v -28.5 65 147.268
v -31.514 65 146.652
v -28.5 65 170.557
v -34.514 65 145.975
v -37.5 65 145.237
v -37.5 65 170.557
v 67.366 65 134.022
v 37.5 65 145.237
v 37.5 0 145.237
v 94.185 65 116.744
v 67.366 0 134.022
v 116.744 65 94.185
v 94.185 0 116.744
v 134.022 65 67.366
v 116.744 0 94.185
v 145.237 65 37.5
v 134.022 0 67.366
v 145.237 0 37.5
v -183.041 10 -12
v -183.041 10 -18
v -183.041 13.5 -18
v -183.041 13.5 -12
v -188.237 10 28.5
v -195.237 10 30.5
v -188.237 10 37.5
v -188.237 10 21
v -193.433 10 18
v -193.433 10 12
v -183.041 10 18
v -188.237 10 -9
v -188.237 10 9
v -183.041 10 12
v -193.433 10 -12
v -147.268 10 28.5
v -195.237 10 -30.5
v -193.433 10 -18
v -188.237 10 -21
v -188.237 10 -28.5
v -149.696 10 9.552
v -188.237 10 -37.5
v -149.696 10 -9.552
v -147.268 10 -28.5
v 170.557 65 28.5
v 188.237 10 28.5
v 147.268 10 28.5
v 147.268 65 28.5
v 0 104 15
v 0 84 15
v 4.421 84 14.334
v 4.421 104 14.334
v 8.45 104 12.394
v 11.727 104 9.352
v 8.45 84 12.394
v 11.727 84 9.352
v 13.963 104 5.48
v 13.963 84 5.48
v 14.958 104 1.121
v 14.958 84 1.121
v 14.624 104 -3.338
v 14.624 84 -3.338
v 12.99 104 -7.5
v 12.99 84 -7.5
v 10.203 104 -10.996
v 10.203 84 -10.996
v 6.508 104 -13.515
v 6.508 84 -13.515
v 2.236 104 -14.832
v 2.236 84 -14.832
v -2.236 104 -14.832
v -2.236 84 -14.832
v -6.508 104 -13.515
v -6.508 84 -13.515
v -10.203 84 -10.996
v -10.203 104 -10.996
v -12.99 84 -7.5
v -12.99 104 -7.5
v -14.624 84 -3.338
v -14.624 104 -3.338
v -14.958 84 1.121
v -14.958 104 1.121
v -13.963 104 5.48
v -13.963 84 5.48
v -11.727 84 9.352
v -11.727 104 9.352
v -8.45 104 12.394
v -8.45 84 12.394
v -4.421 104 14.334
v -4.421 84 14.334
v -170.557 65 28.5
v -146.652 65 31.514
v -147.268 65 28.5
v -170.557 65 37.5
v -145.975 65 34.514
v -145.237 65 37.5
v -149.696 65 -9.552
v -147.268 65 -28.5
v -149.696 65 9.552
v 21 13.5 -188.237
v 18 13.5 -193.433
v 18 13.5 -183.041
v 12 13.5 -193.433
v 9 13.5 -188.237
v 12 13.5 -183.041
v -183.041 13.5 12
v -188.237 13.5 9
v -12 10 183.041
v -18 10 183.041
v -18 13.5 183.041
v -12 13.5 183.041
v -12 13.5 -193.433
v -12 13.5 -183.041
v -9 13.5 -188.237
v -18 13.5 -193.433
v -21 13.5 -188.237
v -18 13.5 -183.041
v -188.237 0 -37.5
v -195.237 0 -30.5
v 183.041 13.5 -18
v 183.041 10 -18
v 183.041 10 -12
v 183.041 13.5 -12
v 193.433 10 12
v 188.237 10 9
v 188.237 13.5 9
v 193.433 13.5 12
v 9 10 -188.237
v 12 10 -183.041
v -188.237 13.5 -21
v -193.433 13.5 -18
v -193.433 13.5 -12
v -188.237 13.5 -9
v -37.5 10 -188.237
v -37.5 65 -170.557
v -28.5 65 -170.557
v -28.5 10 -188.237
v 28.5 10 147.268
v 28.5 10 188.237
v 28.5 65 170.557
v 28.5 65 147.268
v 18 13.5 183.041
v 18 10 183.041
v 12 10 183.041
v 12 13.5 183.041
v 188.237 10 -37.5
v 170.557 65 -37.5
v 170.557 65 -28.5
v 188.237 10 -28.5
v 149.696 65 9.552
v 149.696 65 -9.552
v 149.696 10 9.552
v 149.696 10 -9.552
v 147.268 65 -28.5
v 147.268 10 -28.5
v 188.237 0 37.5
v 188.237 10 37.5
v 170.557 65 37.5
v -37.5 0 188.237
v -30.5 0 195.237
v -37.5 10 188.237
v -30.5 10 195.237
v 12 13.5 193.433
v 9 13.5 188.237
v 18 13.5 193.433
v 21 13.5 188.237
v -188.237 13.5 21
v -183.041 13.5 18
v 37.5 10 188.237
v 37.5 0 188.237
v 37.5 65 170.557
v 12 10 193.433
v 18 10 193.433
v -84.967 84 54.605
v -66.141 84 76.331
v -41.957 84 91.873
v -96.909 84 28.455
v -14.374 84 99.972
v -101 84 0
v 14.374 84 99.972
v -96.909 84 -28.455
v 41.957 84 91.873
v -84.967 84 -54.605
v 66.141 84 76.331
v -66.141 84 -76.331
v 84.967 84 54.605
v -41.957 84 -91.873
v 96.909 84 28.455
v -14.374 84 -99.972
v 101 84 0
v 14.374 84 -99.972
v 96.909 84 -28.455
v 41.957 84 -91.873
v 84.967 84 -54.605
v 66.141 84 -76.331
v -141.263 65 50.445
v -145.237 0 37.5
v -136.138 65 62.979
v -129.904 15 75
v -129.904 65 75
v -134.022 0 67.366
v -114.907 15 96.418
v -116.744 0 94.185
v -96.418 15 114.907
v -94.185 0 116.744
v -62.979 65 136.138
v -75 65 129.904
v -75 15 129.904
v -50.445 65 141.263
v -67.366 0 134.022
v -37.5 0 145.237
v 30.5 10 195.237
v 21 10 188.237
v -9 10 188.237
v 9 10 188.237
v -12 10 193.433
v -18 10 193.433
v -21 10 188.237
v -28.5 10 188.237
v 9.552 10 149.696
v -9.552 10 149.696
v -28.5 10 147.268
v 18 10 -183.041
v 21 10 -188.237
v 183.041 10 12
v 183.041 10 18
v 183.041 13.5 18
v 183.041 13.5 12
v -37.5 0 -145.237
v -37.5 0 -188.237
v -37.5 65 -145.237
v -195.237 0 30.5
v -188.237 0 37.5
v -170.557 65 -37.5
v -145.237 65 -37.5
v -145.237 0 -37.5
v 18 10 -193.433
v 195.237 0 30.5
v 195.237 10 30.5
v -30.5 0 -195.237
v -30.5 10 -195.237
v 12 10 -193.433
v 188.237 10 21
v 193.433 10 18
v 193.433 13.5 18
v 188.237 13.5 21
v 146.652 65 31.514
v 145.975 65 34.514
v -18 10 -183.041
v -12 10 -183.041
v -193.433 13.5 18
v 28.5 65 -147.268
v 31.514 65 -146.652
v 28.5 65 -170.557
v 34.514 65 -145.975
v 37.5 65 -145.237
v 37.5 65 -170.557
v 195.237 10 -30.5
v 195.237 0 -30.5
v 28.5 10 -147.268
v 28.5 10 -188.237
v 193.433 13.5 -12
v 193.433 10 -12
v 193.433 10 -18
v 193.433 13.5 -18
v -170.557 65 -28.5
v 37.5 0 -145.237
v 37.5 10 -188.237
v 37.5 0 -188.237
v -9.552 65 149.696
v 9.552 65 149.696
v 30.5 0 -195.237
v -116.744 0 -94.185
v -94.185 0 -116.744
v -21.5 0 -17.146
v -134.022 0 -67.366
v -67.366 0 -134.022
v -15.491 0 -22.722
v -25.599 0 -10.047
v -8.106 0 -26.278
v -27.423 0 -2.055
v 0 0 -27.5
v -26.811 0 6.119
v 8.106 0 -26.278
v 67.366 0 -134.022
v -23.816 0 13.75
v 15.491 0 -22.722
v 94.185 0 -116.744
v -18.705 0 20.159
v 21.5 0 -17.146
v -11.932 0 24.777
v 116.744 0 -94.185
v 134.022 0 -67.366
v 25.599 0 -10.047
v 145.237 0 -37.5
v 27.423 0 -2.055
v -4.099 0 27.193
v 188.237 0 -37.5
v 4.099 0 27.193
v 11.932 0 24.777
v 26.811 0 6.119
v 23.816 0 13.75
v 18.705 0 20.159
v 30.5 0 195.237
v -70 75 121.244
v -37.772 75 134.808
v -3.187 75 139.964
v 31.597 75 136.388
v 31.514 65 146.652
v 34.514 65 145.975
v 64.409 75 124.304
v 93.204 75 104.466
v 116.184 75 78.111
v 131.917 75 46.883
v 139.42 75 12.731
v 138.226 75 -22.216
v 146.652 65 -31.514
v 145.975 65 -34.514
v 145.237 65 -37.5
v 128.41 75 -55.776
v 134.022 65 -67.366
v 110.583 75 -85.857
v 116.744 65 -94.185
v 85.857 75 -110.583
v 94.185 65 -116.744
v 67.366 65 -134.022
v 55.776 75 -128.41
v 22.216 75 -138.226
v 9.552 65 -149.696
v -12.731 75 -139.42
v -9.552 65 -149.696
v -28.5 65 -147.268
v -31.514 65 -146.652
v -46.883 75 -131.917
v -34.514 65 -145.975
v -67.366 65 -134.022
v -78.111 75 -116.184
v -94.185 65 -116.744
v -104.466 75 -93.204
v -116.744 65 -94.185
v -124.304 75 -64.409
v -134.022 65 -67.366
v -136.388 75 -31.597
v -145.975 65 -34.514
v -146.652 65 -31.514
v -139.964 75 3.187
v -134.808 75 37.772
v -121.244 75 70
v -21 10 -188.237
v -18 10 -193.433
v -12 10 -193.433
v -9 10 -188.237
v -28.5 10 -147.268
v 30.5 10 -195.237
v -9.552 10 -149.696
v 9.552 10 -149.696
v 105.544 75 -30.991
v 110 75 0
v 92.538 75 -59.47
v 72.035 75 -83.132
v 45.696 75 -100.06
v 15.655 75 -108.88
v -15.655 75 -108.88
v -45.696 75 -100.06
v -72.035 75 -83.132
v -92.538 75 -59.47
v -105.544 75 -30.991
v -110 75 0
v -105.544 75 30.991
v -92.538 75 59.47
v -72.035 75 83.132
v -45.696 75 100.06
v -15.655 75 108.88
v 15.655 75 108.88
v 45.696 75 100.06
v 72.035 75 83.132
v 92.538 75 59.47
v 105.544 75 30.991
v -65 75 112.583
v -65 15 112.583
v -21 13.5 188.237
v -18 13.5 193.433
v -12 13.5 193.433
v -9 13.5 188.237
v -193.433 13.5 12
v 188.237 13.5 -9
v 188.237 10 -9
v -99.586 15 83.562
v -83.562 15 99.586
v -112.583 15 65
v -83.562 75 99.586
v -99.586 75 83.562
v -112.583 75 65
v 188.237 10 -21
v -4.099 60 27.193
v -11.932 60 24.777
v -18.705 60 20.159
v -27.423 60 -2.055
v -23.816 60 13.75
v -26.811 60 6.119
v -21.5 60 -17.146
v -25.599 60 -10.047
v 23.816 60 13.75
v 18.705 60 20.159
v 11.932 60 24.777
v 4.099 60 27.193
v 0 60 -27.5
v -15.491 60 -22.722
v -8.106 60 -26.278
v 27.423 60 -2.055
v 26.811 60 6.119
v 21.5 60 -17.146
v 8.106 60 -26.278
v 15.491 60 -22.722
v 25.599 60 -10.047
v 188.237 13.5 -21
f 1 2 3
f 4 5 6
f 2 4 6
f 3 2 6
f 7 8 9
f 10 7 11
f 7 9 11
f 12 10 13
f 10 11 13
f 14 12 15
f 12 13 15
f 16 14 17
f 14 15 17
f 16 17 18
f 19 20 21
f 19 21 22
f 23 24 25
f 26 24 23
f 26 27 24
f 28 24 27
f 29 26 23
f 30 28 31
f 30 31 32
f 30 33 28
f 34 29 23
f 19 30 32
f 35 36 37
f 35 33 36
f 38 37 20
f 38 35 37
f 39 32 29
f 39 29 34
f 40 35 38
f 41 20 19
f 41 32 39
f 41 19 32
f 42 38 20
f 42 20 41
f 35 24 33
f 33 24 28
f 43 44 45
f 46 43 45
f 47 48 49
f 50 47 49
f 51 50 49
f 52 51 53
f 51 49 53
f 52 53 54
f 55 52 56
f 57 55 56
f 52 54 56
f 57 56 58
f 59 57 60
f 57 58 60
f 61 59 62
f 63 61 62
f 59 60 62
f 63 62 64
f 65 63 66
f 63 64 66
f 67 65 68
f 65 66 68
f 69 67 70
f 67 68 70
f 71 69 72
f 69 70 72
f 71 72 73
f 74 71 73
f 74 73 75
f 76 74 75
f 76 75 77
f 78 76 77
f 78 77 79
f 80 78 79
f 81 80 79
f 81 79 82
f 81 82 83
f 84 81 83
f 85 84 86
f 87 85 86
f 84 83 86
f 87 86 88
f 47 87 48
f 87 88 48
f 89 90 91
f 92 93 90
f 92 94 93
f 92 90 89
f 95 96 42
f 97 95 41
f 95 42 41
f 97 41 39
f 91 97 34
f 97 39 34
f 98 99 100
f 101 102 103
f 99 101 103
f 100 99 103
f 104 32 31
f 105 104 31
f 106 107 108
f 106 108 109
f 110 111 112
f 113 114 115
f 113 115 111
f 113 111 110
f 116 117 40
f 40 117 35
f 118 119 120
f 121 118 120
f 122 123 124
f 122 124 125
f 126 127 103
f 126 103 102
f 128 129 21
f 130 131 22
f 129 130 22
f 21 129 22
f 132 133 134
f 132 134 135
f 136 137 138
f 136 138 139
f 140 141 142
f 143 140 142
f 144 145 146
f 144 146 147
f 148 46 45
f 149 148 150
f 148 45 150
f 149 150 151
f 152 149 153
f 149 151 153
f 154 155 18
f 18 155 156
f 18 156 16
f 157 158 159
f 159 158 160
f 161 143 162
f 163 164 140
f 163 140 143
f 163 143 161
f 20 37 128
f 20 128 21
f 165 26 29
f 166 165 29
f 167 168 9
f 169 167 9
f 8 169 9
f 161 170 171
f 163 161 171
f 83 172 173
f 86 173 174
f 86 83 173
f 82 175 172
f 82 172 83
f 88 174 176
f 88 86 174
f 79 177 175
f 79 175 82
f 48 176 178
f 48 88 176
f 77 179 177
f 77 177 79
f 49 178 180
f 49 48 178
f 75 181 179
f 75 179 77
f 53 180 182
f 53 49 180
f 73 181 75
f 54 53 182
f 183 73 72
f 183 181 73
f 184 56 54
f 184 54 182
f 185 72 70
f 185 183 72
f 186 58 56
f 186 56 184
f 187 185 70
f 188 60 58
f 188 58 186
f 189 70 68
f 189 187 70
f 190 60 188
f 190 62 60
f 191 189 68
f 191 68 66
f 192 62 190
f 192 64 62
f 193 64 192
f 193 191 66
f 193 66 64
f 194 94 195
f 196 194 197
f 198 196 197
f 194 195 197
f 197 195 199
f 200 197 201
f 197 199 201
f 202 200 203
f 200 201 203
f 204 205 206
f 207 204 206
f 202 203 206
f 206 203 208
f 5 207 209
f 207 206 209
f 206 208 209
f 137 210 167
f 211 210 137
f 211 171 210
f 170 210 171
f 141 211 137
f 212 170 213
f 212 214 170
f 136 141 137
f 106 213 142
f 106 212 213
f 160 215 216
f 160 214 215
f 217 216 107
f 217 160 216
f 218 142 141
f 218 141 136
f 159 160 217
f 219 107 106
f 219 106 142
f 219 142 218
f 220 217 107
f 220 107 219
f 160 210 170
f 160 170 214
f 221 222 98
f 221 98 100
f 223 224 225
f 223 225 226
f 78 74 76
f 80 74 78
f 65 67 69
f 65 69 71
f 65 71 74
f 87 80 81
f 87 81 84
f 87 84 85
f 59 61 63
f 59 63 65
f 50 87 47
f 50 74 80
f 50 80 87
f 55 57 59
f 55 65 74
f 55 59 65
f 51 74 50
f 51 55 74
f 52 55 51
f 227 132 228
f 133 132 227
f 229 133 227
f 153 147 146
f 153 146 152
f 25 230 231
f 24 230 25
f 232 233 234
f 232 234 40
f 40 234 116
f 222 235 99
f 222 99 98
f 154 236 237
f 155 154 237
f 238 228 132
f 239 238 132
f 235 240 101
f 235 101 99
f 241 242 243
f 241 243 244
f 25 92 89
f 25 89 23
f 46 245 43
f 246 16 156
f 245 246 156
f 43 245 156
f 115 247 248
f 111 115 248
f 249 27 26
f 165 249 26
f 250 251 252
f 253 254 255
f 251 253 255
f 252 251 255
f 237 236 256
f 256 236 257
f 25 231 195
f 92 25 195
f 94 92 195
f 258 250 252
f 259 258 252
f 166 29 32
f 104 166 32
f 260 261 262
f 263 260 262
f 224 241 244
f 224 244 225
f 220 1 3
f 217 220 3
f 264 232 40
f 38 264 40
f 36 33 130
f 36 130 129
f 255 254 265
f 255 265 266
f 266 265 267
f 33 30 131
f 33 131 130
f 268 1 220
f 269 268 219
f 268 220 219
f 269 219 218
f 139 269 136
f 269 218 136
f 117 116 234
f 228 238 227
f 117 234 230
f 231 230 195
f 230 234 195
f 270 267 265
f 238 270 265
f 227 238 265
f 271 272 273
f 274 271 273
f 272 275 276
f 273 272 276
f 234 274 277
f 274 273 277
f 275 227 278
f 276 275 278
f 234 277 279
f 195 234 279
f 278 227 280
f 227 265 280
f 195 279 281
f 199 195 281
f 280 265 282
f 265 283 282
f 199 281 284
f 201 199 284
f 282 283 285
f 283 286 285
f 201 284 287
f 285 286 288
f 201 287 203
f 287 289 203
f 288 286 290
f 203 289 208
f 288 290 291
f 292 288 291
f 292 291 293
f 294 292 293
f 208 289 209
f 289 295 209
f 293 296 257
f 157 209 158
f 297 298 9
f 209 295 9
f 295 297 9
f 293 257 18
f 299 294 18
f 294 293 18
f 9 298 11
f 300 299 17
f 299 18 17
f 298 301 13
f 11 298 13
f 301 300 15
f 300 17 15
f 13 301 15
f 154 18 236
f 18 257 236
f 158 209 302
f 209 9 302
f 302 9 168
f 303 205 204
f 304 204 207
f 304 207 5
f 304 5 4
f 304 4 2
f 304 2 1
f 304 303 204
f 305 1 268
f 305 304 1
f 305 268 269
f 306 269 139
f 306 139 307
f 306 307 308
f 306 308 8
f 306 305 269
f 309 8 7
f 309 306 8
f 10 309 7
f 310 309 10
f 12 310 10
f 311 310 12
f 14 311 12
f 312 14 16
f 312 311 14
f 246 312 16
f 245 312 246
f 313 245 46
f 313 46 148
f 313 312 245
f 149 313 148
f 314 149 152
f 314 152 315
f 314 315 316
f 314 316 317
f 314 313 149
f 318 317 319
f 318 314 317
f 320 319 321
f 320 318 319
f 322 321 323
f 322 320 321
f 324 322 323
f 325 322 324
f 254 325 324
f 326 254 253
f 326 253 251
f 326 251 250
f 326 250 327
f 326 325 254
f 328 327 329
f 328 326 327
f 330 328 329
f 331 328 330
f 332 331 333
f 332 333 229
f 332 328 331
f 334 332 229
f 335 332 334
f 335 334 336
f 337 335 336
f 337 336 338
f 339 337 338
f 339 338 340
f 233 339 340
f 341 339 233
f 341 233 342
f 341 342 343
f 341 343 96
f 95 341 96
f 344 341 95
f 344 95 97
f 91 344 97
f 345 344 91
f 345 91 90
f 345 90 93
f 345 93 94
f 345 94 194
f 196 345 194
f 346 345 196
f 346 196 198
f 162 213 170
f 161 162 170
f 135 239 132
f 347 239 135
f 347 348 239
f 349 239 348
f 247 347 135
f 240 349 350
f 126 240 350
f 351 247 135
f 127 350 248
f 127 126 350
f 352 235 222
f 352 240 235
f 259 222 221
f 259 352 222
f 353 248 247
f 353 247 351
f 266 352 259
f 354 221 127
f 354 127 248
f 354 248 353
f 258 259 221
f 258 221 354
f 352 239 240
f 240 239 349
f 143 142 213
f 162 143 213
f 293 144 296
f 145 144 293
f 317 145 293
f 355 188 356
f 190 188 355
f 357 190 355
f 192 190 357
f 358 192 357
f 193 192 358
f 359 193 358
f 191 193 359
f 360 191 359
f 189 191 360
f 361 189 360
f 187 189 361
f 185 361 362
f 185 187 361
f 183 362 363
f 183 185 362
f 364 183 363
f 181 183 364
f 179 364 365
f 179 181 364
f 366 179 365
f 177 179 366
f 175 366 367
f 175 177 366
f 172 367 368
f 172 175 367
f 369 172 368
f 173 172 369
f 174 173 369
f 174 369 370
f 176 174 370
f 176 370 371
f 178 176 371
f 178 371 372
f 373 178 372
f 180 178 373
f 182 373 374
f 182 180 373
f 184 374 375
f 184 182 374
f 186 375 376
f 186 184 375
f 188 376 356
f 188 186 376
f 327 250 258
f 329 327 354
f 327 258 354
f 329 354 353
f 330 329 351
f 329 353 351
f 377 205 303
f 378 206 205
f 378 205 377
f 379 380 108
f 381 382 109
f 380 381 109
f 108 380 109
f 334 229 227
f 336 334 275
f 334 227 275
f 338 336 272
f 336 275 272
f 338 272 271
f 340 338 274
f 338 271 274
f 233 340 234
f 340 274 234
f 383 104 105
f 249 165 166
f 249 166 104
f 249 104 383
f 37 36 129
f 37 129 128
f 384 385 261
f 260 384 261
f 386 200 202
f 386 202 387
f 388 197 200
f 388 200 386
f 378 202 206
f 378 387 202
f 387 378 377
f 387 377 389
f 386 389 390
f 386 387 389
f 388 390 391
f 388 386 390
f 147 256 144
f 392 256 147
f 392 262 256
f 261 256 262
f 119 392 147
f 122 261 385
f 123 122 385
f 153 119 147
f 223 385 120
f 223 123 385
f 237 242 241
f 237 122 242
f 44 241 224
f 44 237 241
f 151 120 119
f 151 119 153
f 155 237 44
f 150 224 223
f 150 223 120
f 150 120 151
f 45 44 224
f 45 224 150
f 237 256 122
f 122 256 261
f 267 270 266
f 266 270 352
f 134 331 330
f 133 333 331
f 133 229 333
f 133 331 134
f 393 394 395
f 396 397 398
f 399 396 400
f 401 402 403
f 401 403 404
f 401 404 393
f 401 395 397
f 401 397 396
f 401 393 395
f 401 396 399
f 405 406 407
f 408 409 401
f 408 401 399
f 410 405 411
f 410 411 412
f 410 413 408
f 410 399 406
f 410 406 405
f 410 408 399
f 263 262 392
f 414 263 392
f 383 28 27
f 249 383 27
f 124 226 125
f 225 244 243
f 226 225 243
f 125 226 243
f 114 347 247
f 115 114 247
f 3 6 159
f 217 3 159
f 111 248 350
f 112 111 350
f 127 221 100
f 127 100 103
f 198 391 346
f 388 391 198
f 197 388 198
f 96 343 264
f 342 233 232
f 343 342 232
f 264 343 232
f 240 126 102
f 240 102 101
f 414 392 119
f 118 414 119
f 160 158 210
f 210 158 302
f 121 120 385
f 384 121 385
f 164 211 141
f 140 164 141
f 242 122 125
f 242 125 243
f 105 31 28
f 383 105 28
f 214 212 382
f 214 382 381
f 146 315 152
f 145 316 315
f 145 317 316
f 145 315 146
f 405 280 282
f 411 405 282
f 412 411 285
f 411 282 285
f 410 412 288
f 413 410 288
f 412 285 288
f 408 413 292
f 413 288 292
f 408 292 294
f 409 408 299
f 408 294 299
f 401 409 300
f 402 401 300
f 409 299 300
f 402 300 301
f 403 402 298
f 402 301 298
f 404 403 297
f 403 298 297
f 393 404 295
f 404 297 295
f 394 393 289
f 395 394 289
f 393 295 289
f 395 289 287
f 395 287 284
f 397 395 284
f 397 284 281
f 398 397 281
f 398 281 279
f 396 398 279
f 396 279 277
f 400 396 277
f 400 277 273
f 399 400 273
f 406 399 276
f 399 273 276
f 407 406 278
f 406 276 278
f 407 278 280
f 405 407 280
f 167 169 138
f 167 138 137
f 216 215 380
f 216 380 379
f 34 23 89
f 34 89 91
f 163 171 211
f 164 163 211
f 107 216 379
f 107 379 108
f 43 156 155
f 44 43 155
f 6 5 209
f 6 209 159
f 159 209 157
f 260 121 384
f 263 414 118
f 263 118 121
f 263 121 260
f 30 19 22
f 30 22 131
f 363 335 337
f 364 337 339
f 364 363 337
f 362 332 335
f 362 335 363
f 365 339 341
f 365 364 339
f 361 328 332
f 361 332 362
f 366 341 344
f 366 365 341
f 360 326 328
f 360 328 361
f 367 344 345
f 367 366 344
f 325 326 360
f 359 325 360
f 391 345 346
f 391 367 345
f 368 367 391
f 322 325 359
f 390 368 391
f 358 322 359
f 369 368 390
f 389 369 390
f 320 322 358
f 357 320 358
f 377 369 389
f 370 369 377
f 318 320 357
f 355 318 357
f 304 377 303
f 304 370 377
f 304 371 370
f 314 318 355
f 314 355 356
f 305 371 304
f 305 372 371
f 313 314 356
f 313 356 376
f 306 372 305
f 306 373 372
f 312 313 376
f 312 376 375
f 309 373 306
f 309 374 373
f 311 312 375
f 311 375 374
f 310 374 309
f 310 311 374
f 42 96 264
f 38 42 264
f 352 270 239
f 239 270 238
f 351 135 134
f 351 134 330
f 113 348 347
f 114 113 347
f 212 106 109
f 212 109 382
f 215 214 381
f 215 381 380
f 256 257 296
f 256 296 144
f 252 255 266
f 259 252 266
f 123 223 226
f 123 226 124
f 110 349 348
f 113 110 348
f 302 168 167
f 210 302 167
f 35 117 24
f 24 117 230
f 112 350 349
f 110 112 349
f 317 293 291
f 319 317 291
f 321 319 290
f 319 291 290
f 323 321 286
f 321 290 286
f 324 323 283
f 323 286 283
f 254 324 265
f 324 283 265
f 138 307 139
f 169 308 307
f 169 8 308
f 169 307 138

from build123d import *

# Parameters (mm, degrees)
SKETCH1_R                    = 150
BOSS_EXTRUDE1_DEPTH          = 75
CHAMFER1_SIZE                = 10
BOSS_EXTRUDE2_DEPTH          = 10
CHAMFER2_SIZE                = 7
BOSS_EXTRUDE3_DEPTH          = 9
BOSS_EXTRUDE4_DEPTH          = 3.5
CIRPATTERN1_COUNT            = 4
CIRPATTERN1_COPY_1_DEPTH     = 9
CIRPATTERN1_COPY_2_DEPTH     = 9
CIRPATTERN1_COPY_3_DEPTH     = 9
CIRPATTERN1_COPY_4_DEPTH     = 3.5
CIRPATTERN1_COPY_5_DEPTH     = 3.5
CIRPATTERN1_COPY_6_DEPTH     = 3.5
CHAMFER2_OF_CIRPATTERN1_SIZE = 7
SKETCH5_R                    = 110
BOSS_EXTRUDE5_DEPTH          = 9
BOSS_EXTRUDE5_TAPER          = 45
CUT_EXTRUDE1_START           = -60
CUT_EXTRUDE1_DEPTH           = 60
SKETCH7_R                    = 15
BOSS_EXTRUDE6_DEPTH          = 20
SKETCH8_R                    = 27.5
CUT_EXTRUDE2_DEPTH           = 60


with BuildPart() as part:
    # Sketch1 → Boss-Extrude1 (new body)
    with BuildSketch(Plane(origin=(0, 0, 0), x_dir=(1, 0, 0), z_dir=(0, 1, 0))):
        with Locations(Location((0, 0, 0), (0, 0, 270))):
            Circle(SKETCH1_R)
    extrude(amount=BOSS_EXTRUDE1_DEPTH)

    # Chamfer1
    chamfer1_edges = [part.edges().sort_by_distance(p)[0] for p in [
        (0, 75, -150),
    ]]
    chamfer(chamfer1_edges, length=CHAMFER1_SIZE)

    # Sketch2 → Boss-Extrude2 (add)
    with BuildSketch(Plane.XZ):
        with BuildLine():
            Line((145.236875483, 37.5), (195.236875483, 37.5))
            Line((195.236875483, 37.5), (195.236875483, -37.5))
            Line((195.236875483, -37.5), (145.236875483, -37.5))
            ThreePointArc((145.236875483, -37.5), (150, 0), (145.236875483, 37.5))
        make_face()
    boss_extrude2 = extrude(amount=-BOSS_EXTRUDE2_DEPTH)

    # Chamfer2
    chamfer2_edges = [part.edges().sort_by_distance(p)[0] for p in [
        (195.236875483, 5, 37.5),
        (195.236875483, 5, -37.5),
    ]]
    chamfer(chamfer2_edges, length=CHAMFER2_SIZE)

    # Sketch3 → Boss-Extrude3 (add)
    with BuildSketch(Plane(origin=(0, 0, -37.5), x_dir=(-1, 0, 0), z_dir=(0, 0, -1))):
        Polygon((-145.236875483, 10), (-145.236875483, 65), (-170.556875483, 65), (-188.236875483, 10), align=None)
    boss_extrude3 = extrude(amount=-BOSS_EXTRUDE3_DEPTH)

    # Sketch4 → Boss-Extrude4 (add)
    with BuildSketch(Plane(origin=(0, 10, 0), x_dir=(1, 0, 0), z_dir=(0, 1, 0))):
        Polygon((188.236875483, 21), (183.04072306, 18), (183.04072306, 12), (188.236875483, 9), (193.433027905, 12), (193.433027905, 18), align=None)
    boss_extrude4 = extrude(amount=BOSS_EXTRUDE4_DEPTH)

    # Mirror1: Boss-Extrude3, Boss-Extrude4 across plane
    add(boss_extrude3.mirror(Plane.XY))
    add(boss_extrude4.mirror(Plane.XY))

    # CirPattern1: Boss-Extrude2, Boss-Extrude3, Boss-Extrude4 ×4 about axis
    cirpattern1_axis = Axis((0, 0, 0), (0, 1, 0))
    add([boss_extrude2.rotate(cirpattern1_axis, i * 360 / CIRPATTERN1_COUNT) for i in range(1, CIRPATTERN1_COUNT)])
    add([boss_extrude3.rotate(cirpattern1_axis, i * 360 / CIRPATTERN1_COUNT) for i in range(1, CIRPATTERN1_COUNT)])
    add([boss_extrude4.rotate(cirpattern1_axis, i * 360 / CIRPATTERN1_COUNT) for i in range(1, CIRPATTERN1_COUNT)])

    # CirPattern1 copy 1 sketch → CirPattern1 copy 1 (add)
    with BuildSketch(Plane(origin=(37.5, 0, 0), x_dir=(0, 0, 1), z_dir=(1, 0, 0))):
        Polygon((-145.236875483, -10), (-145.236875483, -65), (-170.556875483, -65), (-188.236875483, -10), align=None)
    extrude(amount=-CIRPATTERN1_COPY_1_DEPTH)

    # CirPattern1 copy 2 sketch → CirPattern1 copy 2 (add)
    with BuildSketch(Plane(origin=(0, 0, -37.5), x_dir=(1, 0, 0), z_dir=(0, 0, -1))):
        Polygon((-145.236875483, -10), (-145.236875483, -65), (-170.556875483, -65), (-188.236875483, -10), align=None)
    extrude(amount=-CIRPATTERN1_COPY_2_DEPTH)

    # CirPattern1 copy 3 sketch → CirPattern1 copy 3 (add)
    with BuildSketch(Plane(origin=(-37.5, 0, 0), x_dir=(0, 0, -1), z_dir=(-1, 0, 0))):
        Polygon((-145.236875483, -10), (-145.236875483, -65), (-170.556875483, -65), (-188.236875483, -10), align=None)
    extrude(amount=-CIRPATTERN1_COPY_3_DEPTH)

    # CirPattern1 copy 4 sketch → CirPattern1 copy 4 (add)
    with BuildSketch(Plane(origin=(0, 10, 0), x_dir=(0, 0, -1), z_dir=(0, 1, 0))):
        Polygon((188.236875483, -21), (183.04072306, -18), (183.04072306, -12), (188.236875483, -9), (193.433027905, -12), (193.433027905, -18), align=None)
    extrude(amount=CIRPATTERN1_COPY_4_DEPTH)

    # CirPattern1 copy 5 sketch → CirPattern1 copy 5 (add)
    with BuildSketch(Plane(origin=(0, 10, 0), x_dir=(-1, 0, 0), z_dir=(0, 1, 0))):
        Polygon((188.236875483, -21), (183.04072306, -18), (183.04072306, -12), (188.236875483, -9), (193.433027905, -12), (193.433027905, -18), align=None)
    extrude(amount=CIRPATTERN1_COPY_5_DEPTH)

    # CirPattern1 copy 6 sketch → CirPattern1 copy 6 (add)
    with BuildSketch(Plane.ZX.offset(10)):
        Polygon((188.236875483, -21), (183.04072306, -18), (183.04072306, -12), (188.236875483, -9), (193.433027905, -12), (193.433027905, -18), align=None)
    extrude(amount=CIRPATTERN1_COPY_6_DEPTH)

    # Chamfer2 of CirPattern1
    chamfer2_of_cirpattern1_edges = [part.edges().sort_by_distance(p)[0] for p in [
        (37.5, 5, -195.236875483),
        (-37.5, 5, -195.236875483),
        (-195.236875483, 5, -37.5),
        (-195.236875483, 5, 37.5),
        (-37.5, 5, 195.236875483),
        (37.5, 5, 195.236875483),
    ]]
    chamfer(chamfer2_of_cirpattern1_edges, length=CHAMFER2_OF_CIRPATTERN1_SIZE)

    # Sketch5 → Boss-Extrude5 (add)
    with BuildSketch(Plane(origin=(0, 75, 0), x_dir=(1, 0, 0), z_dir=(0, 1, 0))):
        Circle(SKETCH5_R)
    extrude(amount=BOSS_EXTRUDE5_DEPTH, taper=BOSS_EXTRUDE5_TAPER)

    # Sketch6 → Cut-Extrude1 (cut)
    with BuildSketch(Plane(origin=(0, 75, 0), x_dir=(1, 0, 0), z_dir=(0, 1, 0)).offset(CUT_EXTRUDE1_START)):
        with BuildLine():
            Line((-112.583302492, -65), (-129.903810568, -75))
            ThreePointArc((-129.903810568, -75), (-106.066017178, -106.066017178), (-75, -129.903810568))
            Line((-75, -129.903810568), (-65, -112.583302492))
            ThreePointArc((-65, -112.583302492), (-91.923881554, -91.923881554), (-112.583302492, -65))
        make_face()
    extrude(amount=CUT_EXTRUDE1_DEPTH, mode=Mode.SUBTRACT)

    # Sketch7 → Boss-Extrude6 (add)
    with BuildSketch(Plane(origin=(0, 84, 0), x_dir=(1, 0, 0), z_dir=(0, 1, 0))):
        with Locations(Location((0, 0, 0), (0, 0, 270))):
            Circle(SKETCH7_R)
    extrude(amount=BOSS_EXTRUDE6_DEPTH)

    # Sketch8 → Cut-Extrude2 (cut)
    with BuildSketch(Plane.XZ):
        with Locations(Location((0, 0, 0), (0, 0, 270))):
            Circle(SKETCH8_R)
    extrude(amount=-CUT_EXTRUDE2_DEPTH, mode=Mode.SUBTRACT)


solid = part.part
